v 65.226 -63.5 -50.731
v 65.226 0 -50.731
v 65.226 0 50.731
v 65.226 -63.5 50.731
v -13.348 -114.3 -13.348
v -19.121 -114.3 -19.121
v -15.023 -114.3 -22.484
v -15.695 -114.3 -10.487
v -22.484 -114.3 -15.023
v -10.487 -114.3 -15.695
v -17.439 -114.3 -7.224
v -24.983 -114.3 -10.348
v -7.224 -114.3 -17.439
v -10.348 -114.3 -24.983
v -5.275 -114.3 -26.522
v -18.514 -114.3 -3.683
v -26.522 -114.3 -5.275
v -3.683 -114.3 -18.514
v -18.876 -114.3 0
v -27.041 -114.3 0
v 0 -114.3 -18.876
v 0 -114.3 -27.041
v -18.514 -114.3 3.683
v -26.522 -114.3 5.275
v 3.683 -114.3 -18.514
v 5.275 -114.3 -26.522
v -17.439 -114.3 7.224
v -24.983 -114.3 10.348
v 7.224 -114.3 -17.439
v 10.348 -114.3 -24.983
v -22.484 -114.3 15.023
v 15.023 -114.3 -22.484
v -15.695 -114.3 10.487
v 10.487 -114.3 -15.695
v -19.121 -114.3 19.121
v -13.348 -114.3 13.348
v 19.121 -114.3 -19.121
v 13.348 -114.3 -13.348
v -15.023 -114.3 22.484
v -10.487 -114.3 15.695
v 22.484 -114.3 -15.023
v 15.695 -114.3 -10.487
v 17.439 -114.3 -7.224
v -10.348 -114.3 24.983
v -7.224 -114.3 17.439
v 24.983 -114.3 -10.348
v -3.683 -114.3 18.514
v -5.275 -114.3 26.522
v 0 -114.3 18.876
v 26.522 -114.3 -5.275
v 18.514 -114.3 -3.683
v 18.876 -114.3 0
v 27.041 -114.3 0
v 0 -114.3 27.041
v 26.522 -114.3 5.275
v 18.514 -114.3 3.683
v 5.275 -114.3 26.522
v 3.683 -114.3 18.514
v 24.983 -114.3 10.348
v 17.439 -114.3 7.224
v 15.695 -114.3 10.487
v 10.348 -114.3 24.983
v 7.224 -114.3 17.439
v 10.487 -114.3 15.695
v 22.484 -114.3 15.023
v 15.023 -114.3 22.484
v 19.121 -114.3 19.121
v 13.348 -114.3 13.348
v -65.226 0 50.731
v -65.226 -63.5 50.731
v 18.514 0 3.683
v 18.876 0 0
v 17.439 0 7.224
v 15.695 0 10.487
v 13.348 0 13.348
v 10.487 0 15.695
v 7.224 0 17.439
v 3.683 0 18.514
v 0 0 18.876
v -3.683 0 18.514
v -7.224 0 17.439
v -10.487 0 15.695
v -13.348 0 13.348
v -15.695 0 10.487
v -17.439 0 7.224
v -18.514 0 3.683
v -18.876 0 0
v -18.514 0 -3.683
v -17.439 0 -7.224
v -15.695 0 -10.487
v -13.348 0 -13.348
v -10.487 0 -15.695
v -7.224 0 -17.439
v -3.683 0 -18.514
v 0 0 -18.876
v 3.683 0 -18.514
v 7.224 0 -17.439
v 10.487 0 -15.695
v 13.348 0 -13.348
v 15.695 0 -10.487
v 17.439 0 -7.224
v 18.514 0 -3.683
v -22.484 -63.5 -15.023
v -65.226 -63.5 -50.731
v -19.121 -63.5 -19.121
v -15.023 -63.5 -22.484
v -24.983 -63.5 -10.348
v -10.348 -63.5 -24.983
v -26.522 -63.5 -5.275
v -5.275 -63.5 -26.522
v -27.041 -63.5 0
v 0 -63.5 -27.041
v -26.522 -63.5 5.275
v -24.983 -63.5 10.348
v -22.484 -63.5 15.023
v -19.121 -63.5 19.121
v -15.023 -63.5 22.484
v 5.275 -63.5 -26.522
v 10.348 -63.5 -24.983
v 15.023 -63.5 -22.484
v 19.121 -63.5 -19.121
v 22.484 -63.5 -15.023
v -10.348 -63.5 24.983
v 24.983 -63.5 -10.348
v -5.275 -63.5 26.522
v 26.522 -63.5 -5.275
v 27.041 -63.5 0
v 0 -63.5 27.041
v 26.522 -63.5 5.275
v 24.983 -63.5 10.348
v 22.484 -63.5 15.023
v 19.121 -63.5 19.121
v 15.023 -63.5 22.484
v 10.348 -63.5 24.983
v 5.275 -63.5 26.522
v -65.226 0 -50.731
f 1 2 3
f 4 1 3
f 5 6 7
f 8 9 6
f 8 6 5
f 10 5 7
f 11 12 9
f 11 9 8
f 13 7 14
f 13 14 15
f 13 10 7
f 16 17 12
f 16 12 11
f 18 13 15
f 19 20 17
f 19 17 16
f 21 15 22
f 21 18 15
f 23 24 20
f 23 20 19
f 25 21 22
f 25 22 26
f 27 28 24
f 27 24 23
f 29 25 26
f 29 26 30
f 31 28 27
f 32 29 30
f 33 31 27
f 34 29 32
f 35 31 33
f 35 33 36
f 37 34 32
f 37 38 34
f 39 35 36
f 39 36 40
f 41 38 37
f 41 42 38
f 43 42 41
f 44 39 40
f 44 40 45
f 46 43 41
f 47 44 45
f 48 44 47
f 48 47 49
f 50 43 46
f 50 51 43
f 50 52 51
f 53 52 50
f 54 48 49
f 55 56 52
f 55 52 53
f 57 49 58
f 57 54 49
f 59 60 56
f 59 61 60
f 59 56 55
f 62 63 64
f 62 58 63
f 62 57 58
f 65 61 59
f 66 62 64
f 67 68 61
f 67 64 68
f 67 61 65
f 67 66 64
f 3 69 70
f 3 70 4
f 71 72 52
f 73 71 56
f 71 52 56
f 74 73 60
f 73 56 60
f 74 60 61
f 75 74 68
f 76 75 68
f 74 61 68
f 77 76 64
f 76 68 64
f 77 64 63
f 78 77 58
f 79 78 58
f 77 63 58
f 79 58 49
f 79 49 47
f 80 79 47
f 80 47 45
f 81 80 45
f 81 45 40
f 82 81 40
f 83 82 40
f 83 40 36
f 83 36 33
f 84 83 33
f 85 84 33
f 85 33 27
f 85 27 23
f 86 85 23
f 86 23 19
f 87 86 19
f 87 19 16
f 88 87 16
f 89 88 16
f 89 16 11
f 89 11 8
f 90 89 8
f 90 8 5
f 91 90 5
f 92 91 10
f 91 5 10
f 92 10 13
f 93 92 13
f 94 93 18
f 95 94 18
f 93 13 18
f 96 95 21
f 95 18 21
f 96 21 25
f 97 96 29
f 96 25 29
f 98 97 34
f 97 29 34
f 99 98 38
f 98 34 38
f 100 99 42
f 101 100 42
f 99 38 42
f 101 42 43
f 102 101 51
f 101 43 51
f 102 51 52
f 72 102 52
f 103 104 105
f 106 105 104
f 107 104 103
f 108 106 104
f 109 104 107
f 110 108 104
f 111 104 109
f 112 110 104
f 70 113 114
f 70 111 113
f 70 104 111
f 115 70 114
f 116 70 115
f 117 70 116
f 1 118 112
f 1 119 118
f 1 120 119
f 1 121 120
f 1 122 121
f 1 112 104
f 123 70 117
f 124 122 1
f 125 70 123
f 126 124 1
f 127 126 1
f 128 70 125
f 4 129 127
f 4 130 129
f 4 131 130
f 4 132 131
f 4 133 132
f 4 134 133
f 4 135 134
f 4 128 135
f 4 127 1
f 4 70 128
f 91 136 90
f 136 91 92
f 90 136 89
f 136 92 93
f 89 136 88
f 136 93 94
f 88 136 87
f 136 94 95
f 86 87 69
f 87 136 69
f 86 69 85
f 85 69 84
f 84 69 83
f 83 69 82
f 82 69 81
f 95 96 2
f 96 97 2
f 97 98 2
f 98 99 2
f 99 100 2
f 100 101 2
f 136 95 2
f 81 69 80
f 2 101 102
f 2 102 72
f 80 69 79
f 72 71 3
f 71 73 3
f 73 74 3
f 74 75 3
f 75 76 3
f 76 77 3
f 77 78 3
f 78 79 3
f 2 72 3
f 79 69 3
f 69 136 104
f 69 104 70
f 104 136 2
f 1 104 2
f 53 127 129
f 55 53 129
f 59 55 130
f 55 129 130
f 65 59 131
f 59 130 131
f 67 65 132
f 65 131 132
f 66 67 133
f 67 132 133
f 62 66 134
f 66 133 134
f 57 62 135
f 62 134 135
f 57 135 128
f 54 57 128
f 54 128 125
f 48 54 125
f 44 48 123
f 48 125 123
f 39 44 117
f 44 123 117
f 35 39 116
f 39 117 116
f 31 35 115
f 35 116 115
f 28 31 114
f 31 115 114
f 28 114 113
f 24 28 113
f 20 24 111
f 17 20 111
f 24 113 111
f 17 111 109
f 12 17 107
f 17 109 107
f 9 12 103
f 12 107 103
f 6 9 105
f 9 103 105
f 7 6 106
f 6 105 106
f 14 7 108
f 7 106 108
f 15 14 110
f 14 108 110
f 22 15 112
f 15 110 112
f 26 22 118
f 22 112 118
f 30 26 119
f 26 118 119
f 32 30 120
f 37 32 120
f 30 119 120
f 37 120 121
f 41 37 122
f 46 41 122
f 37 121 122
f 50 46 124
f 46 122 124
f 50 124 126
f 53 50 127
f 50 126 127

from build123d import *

# Parameters (mm, degrees)
F0_W     = 130.451084
F0_H     = 101.461962
F1_DEPTH = 63.5
F2_R     = 27.0412
F3_DEPTH = 50.8
F4_R     = 18.876355
F5_DEPTH = 179.578


with BuildPart() as f1:
    # F0 (on Front) → F1 (new body)
    with BuildSketch(Plane.XZ):
        Rectangle(F0_W, F0_H)
    extrude(amount=F1_DEPTH)

    # F2 (on face) → F3 (join)
    with BuildSketch(Plane.XZ.offset(63.5)):
        Circle(F2_R)
    extrude(amount=F3_DEPTH)

    # F4 (on face) → F5 (cut)
    with BuildSketch(Plane.XZ.offset(114.3)):
        Circle(F4_R)
    extrude(amount=-F5_DEPTH, mode=Mode.SUBTRACT)


solid = f1.part
